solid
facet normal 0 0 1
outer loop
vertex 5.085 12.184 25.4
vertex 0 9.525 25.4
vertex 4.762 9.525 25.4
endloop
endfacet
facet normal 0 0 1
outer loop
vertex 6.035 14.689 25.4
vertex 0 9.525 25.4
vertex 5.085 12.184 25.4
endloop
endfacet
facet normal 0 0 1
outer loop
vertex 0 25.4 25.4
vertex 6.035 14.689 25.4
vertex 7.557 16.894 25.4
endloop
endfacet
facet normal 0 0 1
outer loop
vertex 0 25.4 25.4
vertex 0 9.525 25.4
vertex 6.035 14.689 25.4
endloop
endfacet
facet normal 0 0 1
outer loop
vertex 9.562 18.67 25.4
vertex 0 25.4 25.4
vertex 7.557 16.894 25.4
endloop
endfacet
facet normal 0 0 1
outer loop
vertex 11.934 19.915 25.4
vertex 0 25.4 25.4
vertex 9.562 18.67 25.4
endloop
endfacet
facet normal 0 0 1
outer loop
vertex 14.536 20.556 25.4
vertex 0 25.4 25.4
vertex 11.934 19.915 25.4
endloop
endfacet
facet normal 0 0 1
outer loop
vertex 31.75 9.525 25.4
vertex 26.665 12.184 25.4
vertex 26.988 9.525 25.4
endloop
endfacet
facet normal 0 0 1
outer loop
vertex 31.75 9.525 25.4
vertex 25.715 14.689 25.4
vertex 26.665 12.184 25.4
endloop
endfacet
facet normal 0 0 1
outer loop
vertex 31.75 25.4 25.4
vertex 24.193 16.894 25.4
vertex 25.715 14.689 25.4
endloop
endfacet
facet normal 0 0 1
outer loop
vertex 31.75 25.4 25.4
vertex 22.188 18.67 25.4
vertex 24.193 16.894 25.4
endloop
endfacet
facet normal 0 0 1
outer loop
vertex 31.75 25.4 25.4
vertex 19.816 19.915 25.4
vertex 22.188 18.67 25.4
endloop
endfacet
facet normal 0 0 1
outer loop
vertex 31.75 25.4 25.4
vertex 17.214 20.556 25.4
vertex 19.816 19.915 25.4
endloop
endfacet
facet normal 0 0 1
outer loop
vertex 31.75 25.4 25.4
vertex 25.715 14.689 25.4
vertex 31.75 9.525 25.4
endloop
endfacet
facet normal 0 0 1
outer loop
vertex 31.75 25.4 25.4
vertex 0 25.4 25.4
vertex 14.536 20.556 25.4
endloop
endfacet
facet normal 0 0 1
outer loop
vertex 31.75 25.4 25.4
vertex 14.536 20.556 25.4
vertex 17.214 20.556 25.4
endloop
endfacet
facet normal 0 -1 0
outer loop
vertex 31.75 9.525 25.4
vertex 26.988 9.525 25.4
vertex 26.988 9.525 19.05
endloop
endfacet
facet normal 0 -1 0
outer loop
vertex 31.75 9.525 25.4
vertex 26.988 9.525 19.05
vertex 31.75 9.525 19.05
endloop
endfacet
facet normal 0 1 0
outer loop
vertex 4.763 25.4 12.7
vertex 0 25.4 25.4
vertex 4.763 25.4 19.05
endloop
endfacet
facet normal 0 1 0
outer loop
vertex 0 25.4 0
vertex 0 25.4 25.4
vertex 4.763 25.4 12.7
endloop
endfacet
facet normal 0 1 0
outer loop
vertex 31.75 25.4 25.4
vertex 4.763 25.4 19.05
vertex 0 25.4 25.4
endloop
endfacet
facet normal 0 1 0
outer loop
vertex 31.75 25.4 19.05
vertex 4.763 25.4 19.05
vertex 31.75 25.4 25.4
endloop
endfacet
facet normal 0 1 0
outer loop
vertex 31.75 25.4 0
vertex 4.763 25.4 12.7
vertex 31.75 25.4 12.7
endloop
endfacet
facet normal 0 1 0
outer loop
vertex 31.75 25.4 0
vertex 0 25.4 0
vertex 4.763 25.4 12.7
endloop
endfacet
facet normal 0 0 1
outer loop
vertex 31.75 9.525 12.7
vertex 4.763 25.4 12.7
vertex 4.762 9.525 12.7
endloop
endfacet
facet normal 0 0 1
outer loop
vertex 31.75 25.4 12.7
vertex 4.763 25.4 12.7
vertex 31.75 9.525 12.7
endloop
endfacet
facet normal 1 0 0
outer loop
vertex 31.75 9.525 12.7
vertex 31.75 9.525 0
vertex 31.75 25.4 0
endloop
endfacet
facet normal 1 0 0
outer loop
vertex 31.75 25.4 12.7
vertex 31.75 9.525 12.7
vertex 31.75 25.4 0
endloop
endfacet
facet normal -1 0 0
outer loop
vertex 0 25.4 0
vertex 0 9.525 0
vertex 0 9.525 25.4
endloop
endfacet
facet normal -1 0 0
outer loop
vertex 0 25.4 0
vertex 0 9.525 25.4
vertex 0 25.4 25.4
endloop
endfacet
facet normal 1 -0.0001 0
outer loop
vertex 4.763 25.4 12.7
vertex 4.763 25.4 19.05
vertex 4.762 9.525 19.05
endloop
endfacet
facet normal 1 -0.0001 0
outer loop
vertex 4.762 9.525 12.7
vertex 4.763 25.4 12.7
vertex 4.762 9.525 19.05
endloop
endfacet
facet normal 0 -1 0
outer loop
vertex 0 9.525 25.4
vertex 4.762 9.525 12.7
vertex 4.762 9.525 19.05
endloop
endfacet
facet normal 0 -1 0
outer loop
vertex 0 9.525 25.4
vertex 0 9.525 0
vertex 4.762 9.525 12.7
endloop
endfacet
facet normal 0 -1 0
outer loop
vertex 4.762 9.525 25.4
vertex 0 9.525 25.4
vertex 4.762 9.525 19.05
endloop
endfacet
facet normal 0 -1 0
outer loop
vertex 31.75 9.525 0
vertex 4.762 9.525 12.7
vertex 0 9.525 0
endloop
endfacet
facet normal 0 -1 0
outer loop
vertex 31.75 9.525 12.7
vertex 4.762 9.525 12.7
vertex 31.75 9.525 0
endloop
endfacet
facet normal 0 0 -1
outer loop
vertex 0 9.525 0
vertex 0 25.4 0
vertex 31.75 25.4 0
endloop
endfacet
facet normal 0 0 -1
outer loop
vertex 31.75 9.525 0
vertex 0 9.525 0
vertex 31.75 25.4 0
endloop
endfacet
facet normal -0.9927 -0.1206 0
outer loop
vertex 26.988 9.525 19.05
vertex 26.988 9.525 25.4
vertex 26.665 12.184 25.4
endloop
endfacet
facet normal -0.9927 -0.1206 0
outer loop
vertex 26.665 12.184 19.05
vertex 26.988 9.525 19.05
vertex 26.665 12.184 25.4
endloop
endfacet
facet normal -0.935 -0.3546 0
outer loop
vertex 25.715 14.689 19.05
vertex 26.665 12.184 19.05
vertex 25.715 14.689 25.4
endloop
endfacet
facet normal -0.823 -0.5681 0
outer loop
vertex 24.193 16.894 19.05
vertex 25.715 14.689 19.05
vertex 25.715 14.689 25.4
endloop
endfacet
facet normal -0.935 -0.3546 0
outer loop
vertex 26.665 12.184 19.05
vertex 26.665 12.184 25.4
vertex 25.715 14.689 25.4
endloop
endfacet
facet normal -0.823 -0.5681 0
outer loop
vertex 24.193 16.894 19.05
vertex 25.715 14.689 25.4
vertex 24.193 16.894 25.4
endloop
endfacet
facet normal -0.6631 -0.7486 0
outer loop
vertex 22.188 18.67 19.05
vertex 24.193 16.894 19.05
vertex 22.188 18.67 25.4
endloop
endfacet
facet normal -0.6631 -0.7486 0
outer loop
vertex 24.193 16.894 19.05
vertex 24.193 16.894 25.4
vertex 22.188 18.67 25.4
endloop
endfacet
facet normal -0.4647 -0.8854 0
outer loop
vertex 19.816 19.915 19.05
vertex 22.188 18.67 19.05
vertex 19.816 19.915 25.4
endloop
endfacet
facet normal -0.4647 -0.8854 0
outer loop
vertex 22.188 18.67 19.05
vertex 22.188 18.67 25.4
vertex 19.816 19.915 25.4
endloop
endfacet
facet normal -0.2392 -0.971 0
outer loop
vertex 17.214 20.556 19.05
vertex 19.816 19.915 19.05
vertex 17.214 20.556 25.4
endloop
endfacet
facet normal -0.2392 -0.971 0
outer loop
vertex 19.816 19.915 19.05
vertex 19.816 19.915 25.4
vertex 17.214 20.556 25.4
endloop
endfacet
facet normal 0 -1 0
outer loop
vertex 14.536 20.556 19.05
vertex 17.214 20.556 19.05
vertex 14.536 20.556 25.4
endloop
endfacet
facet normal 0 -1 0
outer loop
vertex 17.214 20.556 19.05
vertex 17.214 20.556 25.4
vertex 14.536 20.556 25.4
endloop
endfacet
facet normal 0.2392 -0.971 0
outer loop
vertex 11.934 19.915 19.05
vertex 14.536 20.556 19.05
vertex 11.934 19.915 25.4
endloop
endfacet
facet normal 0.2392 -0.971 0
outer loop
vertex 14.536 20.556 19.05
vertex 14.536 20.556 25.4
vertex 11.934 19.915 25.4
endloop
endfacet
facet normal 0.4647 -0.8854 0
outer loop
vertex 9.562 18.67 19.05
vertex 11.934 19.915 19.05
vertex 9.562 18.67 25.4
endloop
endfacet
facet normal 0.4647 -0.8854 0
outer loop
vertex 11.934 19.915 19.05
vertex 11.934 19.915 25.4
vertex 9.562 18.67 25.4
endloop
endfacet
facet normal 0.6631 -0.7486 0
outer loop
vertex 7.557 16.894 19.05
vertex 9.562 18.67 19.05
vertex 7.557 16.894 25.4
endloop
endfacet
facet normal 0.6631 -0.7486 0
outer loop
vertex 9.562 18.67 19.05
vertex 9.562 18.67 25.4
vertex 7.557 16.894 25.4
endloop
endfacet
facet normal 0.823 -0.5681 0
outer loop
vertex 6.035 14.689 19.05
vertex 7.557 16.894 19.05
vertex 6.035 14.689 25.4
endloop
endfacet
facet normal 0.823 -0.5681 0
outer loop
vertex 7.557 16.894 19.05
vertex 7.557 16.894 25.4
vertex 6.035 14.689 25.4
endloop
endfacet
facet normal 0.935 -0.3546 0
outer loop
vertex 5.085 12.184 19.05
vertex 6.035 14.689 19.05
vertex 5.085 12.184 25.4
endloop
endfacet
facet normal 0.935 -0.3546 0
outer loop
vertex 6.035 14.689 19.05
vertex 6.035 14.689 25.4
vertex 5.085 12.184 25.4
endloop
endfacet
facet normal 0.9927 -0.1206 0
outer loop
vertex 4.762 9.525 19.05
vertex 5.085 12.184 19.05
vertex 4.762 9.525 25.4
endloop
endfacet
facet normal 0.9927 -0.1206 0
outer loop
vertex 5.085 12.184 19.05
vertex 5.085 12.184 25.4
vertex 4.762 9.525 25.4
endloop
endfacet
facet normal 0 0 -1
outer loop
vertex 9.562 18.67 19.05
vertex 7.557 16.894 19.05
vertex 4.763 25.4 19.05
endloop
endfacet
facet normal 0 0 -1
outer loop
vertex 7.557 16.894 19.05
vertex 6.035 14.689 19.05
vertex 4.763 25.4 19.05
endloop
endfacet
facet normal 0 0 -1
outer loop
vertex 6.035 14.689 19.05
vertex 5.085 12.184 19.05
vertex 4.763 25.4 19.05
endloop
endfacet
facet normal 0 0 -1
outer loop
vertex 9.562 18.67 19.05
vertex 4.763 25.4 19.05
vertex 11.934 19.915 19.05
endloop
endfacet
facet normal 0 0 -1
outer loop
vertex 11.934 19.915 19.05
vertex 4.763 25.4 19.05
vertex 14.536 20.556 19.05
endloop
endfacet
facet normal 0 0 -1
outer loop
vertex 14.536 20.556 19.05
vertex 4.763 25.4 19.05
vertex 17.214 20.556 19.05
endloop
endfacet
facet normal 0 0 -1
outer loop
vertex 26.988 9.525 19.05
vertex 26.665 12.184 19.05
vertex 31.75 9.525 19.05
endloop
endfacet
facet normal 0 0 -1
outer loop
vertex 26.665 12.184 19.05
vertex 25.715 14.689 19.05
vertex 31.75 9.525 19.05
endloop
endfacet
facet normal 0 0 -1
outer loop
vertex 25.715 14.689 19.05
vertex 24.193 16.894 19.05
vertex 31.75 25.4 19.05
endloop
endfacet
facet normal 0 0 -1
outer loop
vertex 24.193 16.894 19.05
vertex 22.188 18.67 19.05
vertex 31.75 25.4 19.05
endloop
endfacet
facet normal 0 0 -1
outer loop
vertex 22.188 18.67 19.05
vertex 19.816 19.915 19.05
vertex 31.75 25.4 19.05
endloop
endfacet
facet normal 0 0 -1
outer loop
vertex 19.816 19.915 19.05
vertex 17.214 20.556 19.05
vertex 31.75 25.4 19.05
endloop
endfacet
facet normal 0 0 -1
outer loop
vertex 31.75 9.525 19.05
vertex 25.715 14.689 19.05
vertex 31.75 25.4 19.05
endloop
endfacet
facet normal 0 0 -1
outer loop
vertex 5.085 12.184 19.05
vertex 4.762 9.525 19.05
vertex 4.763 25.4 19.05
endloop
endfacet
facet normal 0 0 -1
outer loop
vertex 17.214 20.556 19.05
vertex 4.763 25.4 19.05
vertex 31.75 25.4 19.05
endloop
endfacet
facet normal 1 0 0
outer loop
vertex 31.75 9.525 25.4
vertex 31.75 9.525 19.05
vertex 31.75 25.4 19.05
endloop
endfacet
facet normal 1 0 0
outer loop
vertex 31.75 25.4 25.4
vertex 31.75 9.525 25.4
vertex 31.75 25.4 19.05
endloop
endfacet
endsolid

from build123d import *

# Parameters (mm, degrees)
F0_W     = 31.75
F0_H     = 31.75
F1_DEPTH = 25.4
F3_DEPTH = 12.7
F4_W     = 26.9875
F4_H     = 31.75
F5_DEPTH = 6.35
F6_W     = 31.75
F6_H     = 9.525
F7_DEPTH = 25.401
F8_W     = 31.75
F8_H     = 6.35
F9_DEPTH = 25.401


with BuildPart() as f1:
    # F0 (on Top) → F1 (new body)
    with BuildSketch(Plane.XY):
        with Locations((15.875, 15.875)):
            Rectangle(F0_W, F0_H)
    extrude(amount=F1_DEPTH)

    # F2 (on face) → F3 (cut)
    with BuildSketch(Plane.XY.offset(25.4)):
        with BuildLine():
            Line((26.9875, 0), (26.9875, 9.525))
            ThreePointArc((26.9875, 9.525), (15.875, 20.6375), (4.7625, 9.525))
            Line((4.7625, 9.525), (4.7625, 0))
            Line((4.7625, 0), (26.9875, 0))
        make_face()
    extrude(amount=-F3_DEPTH, mode=Mode.SUBTRACT)

    # F4 (on face) → F5 (cut)
    with BuildSketch(Plane.XY.offset(12.7)):
        with Locations((18.25625, 15.875)):
            Rectangle(F4_W, F4_H)
    extrude(amount=F5_DEPTH, mode=Mode.SUBTRACT)

    # F6 (on face) → F7 (cut, through all)
    with BuildSketch(Plane.XY.offset(25.4)):
        with Locations((15.875, 4.7625)):
            Rectangle(F6_W, F6_H)
    extrude(amount=-F7_DEPTH, mode=Mode.SUBTRACT)

    # F8 (on Top) → F9 (cut, through all)
    with BuildSketch(Plane.XY):
        with Locations((15.875, 28.575)):
            Rectangle(F8_W, F8_H)
    extrude(amount=F9_DEPTH, mode=Mode.SUBTRACT)


solid = f1.part
